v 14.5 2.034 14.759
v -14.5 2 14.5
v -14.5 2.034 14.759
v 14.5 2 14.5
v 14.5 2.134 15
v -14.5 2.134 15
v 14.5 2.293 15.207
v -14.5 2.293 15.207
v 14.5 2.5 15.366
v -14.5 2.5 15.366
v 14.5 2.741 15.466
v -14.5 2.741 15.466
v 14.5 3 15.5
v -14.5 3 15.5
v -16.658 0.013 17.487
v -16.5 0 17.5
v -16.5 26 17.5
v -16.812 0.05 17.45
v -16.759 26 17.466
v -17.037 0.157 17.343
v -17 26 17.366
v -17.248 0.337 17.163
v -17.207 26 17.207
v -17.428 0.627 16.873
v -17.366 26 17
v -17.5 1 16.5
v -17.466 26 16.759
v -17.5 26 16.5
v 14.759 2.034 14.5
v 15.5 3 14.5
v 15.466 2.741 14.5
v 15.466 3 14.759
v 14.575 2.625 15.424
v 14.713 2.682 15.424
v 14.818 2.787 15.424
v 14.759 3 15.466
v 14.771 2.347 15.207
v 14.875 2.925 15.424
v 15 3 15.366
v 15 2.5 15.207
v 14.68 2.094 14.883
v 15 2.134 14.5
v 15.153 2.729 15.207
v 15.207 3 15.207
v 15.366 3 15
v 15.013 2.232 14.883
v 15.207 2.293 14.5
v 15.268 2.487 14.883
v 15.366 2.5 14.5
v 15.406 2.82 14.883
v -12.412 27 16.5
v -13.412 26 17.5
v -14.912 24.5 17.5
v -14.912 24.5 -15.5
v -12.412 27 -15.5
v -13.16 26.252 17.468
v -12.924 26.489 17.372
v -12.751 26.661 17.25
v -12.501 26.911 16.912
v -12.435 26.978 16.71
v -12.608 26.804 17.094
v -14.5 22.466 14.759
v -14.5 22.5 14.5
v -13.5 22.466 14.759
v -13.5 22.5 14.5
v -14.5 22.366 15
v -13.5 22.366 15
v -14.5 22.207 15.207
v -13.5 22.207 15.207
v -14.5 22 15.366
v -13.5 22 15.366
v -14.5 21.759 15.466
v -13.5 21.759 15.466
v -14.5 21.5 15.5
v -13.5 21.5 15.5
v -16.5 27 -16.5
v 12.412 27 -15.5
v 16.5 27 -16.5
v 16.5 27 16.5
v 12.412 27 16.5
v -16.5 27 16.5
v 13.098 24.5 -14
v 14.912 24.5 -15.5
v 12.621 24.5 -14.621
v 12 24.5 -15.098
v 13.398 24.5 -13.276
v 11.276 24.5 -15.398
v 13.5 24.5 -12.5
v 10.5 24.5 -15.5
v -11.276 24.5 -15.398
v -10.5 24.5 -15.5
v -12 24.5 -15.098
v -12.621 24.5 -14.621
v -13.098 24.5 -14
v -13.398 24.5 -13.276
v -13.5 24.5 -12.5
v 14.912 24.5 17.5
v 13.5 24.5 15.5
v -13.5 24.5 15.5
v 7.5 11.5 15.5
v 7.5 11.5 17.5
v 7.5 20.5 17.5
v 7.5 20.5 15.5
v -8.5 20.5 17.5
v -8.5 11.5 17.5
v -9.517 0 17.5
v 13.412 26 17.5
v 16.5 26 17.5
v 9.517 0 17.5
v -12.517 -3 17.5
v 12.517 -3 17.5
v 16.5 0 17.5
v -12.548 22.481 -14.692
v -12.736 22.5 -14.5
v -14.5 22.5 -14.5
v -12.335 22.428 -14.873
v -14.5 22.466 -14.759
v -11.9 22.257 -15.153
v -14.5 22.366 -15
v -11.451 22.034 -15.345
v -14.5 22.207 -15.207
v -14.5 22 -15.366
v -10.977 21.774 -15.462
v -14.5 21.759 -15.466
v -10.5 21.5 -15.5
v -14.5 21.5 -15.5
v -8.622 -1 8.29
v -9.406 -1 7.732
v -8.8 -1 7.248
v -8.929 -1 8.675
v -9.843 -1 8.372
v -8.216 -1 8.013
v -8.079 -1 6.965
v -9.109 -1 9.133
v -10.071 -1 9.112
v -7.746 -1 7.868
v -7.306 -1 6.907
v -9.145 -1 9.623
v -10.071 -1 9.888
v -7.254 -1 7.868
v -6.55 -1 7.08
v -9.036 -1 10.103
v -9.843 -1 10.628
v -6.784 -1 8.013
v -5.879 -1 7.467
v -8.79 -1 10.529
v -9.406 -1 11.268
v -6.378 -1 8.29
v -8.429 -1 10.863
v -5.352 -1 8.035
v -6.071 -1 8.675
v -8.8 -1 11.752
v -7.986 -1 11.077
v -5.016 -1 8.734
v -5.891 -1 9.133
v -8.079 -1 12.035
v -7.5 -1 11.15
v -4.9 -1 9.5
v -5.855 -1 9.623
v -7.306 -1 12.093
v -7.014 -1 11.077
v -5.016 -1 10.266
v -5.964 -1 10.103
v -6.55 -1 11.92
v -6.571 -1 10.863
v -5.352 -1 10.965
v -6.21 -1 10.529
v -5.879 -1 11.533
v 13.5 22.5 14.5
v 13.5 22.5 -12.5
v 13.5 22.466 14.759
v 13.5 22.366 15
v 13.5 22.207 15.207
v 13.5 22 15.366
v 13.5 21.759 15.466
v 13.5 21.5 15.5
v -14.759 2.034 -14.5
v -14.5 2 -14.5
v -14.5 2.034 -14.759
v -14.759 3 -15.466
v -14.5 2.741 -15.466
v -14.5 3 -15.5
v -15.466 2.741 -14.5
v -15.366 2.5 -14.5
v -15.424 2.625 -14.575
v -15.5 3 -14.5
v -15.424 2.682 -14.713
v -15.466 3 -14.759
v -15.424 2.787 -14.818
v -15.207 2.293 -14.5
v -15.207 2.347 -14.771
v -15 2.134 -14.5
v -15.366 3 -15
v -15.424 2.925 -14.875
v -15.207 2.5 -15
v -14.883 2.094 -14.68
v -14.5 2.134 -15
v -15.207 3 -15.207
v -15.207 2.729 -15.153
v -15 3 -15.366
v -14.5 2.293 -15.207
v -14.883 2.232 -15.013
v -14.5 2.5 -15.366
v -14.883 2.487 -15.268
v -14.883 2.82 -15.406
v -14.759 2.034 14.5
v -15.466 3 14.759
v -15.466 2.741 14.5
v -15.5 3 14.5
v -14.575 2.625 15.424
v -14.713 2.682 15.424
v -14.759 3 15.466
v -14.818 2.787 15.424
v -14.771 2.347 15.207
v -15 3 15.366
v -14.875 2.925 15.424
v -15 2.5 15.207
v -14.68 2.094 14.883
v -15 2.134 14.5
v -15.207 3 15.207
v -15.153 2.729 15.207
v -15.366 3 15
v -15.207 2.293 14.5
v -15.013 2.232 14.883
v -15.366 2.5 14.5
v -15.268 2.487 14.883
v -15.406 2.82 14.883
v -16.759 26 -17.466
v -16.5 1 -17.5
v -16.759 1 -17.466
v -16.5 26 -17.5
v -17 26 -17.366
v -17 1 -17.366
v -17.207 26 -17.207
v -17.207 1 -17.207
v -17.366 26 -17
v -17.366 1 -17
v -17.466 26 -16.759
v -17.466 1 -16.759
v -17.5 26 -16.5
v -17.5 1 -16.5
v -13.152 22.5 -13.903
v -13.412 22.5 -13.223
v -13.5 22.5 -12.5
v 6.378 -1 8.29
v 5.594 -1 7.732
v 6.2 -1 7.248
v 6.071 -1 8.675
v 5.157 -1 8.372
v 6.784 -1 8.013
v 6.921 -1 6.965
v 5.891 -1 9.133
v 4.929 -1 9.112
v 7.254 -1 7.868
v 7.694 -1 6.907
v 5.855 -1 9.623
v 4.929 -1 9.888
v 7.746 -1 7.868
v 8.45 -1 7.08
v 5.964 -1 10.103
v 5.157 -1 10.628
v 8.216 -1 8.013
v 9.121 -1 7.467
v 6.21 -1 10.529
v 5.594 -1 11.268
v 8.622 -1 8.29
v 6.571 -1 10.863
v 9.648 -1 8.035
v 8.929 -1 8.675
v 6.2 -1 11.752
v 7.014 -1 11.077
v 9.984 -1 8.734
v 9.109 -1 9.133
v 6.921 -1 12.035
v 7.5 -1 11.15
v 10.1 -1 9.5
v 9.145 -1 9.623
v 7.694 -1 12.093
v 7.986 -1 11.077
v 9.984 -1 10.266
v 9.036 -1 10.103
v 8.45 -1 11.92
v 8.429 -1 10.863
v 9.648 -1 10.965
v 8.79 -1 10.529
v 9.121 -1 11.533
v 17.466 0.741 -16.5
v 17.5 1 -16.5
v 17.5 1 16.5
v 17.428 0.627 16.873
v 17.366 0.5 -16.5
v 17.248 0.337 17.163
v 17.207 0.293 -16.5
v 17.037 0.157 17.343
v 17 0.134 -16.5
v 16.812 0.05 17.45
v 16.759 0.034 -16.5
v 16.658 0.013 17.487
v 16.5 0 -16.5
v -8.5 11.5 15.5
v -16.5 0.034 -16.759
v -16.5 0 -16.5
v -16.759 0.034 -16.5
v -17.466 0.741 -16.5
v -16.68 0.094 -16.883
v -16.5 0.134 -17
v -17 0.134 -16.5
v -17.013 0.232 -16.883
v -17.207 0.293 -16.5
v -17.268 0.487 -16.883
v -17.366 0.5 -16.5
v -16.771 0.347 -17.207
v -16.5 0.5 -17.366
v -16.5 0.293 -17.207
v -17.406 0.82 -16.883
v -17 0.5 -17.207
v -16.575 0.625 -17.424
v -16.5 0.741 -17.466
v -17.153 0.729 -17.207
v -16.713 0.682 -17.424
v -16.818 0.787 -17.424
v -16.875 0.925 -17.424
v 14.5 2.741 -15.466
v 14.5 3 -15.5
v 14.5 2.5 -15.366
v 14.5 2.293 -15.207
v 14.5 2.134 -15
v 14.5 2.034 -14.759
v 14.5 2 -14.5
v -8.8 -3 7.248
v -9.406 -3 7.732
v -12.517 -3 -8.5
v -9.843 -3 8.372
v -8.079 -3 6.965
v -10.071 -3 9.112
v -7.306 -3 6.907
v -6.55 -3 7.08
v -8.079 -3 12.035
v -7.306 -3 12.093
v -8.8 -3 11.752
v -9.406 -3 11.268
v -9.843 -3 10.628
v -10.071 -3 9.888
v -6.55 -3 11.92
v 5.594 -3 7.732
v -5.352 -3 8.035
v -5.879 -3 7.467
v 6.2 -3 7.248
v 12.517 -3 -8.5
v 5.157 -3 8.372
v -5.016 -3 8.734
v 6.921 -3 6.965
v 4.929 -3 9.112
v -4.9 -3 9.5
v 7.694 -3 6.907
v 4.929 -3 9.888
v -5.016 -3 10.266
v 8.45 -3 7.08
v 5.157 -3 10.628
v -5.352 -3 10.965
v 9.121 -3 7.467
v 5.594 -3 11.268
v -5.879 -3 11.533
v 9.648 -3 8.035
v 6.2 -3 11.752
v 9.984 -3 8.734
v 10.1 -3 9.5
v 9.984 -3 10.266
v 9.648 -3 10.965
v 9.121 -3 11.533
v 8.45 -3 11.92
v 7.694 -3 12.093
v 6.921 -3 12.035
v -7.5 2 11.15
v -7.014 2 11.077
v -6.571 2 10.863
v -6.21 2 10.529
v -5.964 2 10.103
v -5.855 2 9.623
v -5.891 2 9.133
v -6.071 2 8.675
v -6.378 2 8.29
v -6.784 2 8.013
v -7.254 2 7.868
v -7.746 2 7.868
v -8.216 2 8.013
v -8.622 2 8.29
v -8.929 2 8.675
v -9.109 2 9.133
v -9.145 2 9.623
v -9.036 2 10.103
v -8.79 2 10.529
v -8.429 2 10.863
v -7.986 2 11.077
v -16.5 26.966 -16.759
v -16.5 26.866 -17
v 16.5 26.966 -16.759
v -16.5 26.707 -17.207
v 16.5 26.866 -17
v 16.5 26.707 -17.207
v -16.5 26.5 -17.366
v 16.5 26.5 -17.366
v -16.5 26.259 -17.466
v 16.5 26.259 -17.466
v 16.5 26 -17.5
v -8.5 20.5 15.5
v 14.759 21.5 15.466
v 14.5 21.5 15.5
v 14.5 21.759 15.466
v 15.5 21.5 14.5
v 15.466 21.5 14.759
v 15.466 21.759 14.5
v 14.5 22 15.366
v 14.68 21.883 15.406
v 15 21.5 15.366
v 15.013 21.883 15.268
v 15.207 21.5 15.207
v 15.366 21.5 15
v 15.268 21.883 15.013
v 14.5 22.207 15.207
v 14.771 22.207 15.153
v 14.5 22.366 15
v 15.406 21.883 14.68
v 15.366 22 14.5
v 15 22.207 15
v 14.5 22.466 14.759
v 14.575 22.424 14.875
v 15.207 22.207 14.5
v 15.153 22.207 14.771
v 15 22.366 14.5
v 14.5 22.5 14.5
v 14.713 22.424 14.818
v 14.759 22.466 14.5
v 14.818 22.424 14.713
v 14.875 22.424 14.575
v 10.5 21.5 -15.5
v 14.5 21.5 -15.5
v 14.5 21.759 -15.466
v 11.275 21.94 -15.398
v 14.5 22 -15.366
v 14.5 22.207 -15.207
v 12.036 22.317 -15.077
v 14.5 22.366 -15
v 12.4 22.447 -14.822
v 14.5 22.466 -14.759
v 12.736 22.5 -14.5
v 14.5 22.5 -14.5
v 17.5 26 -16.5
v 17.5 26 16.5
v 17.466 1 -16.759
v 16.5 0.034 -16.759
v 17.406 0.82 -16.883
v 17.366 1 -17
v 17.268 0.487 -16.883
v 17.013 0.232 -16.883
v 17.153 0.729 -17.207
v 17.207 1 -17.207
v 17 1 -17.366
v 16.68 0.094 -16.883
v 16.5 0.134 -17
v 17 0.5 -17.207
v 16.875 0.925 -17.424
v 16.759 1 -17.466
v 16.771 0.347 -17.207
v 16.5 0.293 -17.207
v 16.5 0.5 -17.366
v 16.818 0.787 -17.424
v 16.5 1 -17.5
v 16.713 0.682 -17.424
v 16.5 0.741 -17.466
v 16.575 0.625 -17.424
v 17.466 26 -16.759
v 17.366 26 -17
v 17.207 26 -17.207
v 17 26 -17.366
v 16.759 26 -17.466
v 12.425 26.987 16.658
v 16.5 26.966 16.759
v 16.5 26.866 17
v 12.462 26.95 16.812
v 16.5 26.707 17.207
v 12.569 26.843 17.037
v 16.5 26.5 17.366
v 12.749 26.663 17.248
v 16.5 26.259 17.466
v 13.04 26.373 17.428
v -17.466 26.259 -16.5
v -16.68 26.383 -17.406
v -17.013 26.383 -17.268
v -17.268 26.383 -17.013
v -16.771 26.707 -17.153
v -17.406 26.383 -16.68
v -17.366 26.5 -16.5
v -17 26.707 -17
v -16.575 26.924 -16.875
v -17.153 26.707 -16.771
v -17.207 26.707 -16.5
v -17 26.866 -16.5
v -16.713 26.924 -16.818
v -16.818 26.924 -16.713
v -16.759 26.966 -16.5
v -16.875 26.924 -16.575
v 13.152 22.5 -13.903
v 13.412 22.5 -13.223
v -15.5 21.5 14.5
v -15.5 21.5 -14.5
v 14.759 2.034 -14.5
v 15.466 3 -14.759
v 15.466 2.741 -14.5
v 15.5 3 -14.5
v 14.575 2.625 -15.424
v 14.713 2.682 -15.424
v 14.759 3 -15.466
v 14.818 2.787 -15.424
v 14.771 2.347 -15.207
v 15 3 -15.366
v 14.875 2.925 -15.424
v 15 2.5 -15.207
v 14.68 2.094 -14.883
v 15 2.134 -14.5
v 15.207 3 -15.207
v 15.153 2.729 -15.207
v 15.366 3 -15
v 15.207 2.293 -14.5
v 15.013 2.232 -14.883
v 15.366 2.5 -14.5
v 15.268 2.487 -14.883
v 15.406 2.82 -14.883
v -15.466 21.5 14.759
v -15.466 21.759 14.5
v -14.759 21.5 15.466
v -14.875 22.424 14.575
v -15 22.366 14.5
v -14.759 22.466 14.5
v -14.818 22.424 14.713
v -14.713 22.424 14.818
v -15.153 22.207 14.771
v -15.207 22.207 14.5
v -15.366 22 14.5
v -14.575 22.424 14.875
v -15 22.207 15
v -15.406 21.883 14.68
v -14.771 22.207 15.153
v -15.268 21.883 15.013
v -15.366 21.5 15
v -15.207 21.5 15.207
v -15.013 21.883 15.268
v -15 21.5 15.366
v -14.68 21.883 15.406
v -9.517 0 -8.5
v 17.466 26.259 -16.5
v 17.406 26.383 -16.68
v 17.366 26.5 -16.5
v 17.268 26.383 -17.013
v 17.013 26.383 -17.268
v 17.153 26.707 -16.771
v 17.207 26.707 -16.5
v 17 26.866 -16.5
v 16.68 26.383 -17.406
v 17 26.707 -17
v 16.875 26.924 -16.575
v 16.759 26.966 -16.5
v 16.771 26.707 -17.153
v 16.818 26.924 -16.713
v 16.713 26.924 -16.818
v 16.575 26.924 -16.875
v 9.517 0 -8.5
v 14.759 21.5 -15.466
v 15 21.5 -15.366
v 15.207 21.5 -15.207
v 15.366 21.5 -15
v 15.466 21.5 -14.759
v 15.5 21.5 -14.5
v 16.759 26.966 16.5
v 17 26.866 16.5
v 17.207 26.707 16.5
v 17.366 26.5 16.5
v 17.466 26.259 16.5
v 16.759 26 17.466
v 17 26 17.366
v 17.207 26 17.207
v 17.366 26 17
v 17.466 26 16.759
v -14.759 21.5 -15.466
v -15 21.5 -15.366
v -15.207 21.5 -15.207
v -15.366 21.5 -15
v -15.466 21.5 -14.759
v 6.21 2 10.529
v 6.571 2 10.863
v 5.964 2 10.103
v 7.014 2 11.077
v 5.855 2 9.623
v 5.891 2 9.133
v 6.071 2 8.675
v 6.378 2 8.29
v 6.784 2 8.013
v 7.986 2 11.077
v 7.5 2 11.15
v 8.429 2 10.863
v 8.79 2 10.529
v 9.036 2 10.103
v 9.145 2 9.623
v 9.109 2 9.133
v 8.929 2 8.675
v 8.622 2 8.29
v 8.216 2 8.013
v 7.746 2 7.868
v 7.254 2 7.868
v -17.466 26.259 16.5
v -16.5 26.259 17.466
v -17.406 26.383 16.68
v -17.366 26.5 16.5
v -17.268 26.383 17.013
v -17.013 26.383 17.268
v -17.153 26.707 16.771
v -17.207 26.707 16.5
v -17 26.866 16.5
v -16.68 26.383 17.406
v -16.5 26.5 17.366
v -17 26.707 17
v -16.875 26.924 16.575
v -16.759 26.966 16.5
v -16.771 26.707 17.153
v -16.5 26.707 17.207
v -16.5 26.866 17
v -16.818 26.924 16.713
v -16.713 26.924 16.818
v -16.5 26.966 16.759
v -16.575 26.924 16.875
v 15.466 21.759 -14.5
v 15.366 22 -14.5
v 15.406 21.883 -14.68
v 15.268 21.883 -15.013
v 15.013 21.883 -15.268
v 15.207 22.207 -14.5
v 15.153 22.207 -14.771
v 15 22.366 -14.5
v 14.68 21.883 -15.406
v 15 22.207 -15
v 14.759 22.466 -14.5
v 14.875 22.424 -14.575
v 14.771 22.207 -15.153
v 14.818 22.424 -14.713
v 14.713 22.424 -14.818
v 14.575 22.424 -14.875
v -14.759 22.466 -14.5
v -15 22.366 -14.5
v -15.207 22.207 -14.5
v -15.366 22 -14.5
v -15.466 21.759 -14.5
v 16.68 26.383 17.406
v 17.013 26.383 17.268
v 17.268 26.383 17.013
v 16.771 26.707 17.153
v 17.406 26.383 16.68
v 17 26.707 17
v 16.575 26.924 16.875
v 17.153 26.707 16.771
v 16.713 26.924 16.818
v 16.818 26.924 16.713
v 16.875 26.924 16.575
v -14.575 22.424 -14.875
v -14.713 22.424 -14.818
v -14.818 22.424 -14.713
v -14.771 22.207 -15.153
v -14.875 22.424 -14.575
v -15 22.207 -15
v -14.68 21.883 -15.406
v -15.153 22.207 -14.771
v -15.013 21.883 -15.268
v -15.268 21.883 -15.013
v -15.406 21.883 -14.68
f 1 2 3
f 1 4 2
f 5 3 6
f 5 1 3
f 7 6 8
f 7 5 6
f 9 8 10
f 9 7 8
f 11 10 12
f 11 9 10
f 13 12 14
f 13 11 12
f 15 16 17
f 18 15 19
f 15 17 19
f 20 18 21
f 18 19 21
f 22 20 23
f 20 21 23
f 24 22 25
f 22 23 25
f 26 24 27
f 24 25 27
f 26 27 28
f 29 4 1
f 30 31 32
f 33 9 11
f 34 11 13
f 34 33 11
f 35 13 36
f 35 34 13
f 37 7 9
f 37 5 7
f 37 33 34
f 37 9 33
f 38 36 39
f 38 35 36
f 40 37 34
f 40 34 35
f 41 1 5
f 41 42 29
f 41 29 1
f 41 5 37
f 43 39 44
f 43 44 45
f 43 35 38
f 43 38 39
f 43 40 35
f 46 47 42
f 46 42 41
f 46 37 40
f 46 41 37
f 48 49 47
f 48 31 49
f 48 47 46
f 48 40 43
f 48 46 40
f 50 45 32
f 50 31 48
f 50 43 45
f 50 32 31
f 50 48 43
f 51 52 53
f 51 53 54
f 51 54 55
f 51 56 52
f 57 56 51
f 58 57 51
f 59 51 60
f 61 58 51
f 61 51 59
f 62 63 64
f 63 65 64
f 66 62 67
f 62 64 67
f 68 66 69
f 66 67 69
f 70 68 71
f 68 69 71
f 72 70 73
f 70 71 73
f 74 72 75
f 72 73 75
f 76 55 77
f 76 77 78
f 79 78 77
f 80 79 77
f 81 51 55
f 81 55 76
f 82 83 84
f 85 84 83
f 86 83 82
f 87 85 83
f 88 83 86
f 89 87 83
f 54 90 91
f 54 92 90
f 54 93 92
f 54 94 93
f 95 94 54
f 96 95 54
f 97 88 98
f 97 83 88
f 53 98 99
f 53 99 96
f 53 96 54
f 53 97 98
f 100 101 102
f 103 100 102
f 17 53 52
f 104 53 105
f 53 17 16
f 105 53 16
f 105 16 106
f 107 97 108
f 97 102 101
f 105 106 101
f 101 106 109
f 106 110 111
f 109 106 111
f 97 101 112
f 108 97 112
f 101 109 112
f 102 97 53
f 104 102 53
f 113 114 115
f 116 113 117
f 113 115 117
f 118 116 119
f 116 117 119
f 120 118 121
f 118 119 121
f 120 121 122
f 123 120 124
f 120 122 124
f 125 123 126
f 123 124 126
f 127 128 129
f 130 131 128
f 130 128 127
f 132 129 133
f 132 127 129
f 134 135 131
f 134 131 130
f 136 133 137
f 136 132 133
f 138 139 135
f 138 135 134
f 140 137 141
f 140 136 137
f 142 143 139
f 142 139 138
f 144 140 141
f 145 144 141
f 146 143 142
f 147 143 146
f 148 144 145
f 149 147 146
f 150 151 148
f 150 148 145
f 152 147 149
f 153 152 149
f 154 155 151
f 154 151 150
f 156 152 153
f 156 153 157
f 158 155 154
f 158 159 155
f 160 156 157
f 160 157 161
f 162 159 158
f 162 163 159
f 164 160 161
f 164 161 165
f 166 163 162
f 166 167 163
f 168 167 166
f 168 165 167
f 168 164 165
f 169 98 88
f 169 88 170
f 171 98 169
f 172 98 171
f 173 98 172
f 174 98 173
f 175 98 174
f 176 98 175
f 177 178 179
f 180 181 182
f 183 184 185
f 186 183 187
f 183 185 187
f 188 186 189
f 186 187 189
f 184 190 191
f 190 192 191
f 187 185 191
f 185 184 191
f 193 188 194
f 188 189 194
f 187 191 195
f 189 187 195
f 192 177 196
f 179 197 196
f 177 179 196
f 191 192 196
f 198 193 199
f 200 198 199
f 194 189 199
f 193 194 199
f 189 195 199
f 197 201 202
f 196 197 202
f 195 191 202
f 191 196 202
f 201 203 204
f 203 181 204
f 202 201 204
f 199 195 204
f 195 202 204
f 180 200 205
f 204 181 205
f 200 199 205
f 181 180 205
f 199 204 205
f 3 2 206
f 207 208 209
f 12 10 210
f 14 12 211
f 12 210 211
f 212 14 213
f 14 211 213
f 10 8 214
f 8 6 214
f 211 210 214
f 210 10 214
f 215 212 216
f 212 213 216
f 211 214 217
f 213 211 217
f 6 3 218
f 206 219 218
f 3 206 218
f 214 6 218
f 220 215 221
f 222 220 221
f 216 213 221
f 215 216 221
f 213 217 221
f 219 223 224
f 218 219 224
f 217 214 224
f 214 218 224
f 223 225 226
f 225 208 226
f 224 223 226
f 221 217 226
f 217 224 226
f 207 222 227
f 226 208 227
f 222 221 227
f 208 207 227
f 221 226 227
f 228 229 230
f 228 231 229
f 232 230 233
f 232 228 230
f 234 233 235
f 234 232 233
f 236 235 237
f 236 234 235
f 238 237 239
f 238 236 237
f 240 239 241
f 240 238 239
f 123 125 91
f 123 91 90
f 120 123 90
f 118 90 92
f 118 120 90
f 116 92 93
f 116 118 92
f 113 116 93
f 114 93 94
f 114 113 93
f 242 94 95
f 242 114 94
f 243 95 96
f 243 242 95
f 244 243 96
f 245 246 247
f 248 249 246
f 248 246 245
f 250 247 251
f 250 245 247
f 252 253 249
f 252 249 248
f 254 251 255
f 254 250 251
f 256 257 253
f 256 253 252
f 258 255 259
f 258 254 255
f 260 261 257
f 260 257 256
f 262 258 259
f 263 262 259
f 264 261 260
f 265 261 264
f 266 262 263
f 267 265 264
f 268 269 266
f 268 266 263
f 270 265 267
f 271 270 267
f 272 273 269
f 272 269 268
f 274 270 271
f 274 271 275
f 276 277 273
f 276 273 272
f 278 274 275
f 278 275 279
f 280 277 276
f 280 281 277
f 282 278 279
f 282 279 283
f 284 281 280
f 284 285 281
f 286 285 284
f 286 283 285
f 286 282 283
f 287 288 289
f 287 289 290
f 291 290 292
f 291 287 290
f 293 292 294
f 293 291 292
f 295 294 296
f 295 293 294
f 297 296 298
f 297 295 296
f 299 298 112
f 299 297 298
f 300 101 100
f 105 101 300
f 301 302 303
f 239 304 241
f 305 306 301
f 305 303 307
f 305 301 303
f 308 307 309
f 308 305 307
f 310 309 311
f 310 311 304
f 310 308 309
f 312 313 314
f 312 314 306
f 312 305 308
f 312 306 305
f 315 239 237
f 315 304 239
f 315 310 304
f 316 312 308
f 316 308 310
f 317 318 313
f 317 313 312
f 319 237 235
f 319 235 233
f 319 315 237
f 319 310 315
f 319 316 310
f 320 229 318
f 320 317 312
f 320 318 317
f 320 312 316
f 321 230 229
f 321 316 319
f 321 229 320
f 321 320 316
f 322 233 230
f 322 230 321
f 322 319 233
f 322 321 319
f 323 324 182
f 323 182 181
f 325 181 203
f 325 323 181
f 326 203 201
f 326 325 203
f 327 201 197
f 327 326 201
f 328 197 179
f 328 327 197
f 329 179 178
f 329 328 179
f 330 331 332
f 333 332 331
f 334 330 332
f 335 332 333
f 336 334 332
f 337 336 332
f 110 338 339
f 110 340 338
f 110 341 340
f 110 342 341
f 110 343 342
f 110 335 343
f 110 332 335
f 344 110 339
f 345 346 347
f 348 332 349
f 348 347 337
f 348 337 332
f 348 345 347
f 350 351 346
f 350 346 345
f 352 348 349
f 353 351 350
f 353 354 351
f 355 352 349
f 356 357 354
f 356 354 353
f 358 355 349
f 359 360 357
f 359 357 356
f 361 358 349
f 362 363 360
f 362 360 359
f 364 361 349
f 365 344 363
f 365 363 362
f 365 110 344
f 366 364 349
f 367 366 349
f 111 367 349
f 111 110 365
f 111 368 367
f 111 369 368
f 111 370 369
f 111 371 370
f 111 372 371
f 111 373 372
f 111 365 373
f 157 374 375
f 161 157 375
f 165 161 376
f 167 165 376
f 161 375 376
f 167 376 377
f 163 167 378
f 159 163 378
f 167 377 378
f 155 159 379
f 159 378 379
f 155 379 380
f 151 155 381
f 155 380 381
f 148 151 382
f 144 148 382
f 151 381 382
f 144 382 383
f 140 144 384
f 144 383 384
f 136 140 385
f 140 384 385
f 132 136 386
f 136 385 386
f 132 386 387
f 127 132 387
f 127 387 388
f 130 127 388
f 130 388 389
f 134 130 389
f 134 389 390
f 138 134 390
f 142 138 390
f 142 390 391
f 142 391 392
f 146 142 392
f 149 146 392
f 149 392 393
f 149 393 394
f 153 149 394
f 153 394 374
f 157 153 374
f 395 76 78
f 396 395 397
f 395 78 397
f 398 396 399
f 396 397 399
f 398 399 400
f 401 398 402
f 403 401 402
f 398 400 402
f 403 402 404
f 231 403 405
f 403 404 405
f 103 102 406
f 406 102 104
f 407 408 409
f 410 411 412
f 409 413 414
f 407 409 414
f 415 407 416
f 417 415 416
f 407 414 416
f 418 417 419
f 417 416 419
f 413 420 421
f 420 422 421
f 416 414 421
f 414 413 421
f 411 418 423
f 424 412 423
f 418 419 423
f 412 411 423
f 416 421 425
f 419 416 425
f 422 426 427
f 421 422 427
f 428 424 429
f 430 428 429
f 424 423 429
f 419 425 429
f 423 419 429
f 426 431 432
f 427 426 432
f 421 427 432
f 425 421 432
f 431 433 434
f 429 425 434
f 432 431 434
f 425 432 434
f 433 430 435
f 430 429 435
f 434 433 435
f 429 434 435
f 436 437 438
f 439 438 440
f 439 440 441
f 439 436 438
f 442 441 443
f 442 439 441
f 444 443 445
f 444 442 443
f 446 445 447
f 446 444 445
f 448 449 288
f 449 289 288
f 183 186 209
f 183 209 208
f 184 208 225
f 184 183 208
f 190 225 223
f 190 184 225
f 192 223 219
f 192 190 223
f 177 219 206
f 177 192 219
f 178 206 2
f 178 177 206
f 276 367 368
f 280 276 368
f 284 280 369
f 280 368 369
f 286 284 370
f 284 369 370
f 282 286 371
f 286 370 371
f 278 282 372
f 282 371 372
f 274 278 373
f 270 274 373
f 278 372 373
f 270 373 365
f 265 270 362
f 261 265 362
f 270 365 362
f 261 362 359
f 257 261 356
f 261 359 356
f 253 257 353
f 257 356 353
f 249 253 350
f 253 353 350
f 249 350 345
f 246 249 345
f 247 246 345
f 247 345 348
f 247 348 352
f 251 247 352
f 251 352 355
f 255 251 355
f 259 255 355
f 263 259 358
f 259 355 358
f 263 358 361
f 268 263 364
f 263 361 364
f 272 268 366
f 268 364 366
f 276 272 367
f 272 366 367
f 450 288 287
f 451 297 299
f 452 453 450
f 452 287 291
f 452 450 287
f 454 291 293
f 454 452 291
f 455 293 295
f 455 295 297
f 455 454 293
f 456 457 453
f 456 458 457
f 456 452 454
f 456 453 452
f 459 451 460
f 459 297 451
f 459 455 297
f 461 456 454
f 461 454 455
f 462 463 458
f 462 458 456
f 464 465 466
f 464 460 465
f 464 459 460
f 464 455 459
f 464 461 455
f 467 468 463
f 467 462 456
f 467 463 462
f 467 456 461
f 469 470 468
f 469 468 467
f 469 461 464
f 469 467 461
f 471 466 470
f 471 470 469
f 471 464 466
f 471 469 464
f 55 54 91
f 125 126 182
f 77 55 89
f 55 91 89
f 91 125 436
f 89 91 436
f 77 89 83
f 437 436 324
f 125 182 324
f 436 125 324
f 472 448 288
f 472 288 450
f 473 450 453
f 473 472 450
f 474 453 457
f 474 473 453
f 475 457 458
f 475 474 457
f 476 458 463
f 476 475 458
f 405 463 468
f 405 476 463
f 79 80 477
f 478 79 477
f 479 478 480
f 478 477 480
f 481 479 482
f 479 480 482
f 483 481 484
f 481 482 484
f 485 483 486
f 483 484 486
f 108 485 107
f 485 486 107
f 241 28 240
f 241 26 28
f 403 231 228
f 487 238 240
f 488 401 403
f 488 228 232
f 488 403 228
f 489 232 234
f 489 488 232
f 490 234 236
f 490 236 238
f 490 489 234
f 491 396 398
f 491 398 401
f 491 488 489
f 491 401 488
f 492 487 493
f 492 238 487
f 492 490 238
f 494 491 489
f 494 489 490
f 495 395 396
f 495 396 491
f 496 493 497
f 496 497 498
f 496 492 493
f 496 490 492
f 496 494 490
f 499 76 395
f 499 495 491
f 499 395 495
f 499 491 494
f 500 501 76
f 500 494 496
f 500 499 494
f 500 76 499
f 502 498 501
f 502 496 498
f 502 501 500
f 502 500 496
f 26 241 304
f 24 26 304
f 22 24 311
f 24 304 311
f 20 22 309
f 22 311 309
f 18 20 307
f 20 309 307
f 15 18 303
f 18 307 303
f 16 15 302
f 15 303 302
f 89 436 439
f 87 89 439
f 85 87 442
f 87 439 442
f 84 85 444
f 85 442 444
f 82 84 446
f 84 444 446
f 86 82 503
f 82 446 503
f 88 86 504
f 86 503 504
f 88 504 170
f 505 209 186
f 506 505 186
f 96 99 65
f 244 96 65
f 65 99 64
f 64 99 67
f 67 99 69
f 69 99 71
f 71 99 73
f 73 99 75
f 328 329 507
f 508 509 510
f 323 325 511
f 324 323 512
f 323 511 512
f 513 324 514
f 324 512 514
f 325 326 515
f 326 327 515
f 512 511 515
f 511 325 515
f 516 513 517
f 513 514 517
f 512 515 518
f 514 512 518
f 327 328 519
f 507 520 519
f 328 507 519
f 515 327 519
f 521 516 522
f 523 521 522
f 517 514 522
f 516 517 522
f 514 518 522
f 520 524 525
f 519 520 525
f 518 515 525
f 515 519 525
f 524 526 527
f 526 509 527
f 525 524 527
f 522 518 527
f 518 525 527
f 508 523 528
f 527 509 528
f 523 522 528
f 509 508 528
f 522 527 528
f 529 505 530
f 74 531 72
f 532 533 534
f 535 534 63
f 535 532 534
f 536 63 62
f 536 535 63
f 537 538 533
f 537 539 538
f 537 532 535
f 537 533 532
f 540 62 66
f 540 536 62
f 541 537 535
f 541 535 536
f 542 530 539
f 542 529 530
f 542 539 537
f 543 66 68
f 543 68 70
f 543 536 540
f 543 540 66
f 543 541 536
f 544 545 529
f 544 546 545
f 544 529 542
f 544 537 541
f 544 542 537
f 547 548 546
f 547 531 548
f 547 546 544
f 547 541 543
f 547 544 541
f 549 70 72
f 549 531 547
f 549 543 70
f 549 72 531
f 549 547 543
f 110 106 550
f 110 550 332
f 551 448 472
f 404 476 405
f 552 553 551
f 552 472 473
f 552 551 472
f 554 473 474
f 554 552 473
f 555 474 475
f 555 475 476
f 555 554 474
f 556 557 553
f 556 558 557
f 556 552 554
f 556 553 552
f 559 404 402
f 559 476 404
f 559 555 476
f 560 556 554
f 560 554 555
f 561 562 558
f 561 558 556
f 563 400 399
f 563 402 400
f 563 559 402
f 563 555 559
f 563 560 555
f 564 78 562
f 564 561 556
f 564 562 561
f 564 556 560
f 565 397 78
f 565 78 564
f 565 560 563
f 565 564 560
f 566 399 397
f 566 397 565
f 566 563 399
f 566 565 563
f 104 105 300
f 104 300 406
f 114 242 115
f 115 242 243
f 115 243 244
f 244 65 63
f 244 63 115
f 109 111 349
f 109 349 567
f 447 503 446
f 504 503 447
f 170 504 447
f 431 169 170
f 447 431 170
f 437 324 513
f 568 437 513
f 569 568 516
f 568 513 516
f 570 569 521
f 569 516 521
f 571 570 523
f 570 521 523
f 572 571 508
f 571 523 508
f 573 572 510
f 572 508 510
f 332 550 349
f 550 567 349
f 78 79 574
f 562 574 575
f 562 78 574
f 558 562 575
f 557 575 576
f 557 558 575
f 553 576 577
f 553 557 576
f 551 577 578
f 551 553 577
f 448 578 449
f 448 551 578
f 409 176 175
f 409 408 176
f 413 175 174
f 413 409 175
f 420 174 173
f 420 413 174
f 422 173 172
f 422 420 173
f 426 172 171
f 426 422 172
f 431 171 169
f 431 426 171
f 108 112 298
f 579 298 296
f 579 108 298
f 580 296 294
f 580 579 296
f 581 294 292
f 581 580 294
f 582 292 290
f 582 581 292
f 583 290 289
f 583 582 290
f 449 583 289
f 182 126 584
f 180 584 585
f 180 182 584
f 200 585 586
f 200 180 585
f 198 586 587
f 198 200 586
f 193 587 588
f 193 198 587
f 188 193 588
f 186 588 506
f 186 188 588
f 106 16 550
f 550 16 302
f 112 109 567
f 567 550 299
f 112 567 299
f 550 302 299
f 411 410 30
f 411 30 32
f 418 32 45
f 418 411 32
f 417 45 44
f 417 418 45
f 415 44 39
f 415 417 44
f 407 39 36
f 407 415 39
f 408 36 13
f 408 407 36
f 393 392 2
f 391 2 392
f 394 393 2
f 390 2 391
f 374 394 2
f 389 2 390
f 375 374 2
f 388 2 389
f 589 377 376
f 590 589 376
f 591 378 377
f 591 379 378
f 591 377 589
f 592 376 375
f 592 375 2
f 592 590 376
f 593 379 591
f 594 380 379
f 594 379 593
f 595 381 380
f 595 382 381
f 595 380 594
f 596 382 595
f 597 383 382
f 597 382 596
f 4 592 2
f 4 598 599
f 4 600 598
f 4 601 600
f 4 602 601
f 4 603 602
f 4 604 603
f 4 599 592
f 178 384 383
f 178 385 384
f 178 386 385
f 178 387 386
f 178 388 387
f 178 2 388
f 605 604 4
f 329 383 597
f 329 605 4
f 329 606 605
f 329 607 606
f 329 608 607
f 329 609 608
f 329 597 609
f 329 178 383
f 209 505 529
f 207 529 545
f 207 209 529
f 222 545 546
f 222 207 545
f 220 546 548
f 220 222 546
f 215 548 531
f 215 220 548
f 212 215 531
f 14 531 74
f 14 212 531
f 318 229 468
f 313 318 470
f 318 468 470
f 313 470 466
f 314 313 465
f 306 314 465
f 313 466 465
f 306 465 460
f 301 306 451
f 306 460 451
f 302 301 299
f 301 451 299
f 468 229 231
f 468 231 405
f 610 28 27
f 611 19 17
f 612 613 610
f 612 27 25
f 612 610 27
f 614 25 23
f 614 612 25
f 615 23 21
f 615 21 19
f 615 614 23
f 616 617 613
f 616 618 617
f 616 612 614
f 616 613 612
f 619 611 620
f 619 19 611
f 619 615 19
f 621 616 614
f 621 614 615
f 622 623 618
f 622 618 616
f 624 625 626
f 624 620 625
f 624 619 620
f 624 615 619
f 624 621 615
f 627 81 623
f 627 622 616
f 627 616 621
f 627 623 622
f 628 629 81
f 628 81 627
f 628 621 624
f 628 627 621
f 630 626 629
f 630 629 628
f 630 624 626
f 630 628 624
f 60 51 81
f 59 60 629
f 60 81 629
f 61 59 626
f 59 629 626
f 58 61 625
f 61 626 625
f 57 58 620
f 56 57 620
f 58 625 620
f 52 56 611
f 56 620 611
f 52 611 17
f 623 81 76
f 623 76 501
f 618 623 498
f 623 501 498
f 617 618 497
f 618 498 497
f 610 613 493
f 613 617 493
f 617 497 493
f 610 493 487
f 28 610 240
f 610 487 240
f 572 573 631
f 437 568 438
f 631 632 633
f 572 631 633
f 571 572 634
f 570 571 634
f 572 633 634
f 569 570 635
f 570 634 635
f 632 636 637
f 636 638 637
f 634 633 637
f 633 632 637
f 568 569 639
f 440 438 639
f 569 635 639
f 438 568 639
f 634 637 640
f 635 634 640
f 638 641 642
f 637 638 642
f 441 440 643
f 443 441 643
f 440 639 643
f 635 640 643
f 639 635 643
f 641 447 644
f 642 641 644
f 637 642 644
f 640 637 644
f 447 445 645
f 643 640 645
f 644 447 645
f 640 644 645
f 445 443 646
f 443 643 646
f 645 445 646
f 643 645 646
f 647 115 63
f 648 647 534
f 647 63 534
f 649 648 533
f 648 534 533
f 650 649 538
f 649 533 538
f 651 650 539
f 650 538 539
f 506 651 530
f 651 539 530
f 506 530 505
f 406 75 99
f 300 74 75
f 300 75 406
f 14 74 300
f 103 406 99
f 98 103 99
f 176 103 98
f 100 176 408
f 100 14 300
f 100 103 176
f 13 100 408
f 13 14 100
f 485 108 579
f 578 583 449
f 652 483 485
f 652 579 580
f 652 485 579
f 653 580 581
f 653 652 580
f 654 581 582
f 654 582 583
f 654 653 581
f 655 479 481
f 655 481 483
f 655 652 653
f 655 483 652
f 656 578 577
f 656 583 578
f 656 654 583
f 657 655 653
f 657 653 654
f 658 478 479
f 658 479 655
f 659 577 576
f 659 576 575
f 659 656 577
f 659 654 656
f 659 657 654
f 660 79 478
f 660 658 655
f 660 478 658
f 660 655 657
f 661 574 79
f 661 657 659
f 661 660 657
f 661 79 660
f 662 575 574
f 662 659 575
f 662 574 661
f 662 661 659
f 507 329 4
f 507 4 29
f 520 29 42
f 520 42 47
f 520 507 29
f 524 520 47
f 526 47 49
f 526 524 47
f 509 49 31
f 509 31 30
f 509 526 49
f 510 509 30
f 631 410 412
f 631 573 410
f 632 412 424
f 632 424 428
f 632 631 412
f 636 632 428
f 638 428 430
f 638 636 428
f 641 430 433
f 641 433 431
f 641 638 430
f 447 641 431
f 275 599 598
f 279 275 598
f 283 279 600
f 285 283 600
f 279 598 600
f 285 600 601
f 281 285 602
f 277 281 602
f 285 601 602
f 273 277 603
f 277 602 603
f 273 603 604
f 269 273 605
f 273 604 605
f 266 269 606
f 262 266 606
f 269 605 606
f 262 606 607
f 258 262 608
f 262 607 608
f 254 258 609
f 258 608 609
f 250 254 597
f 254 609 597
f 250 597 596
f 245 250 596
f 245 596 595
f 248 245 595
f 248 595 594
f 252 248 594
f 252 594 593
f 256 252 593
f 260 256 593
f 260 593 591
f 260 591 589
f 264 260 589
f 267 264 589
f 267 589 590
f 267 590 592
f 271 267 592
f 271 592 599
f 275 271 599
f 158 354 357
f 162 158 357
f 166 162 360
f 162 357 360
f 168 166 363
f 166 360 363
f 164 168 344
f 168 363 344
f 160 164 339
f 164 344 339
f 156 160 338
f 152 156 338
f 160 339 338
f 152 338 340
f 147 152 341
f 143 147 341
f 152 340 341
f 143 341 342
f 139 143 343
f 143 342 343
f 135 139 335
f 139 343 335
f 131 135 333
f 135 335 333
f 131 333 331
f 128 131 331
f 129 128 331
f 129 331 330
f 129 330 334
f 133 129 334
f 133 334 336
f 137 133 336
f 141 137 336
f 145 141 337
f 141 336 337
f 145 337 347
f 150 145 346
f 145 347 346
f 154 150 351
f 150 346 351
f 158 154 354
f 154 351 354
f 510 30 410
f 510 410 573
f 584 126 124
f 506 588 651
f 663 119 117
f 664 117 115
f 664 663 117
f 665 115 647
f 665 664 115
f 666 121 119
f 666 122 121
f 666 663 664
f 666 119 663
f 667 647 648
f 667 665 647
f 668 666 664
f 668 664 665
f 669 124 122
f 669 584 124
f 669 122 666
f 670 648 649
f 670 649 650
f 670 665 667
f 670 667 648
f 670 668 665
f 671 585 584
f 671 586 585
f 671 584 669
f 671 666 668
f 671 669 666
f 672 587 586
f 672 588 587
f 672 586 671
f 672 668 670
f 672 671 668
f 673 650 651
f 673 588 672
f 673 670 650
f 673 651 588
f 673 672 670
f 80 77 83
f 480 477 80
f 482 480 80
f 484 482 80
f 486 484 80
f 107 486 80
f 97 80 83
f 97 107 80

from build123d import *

# Parameters (mm, degrees)
SKETCH1_W           = 35
SKETCH1_H           = 35
BOSS_EXTRUDE1_DEPTH = 27
SHELL1_T            = -2
CUT_EXTRUDE7_DEPTH  = 33
BOSS_EXTRUDE4_DEPTH = 31
BOSS_EXTRUDE3_DEPTH = 26
FILLET1_R           = 1
FILLET2_R           = 1
FILLET3_R           = 1
FILLET4_R           = 1
SKETCH10_R          = 1.65
CUT_EXTRUDE3_DEPTH  = 36.178118199
SKETCH11_W          = 16
SKETCH11_H          = 9
CUT_EXTRUDE4_DEPTH  = 2
SKETCH13_R          = 2.6
CUT_EXTRUDE6_DEPTH  = 2
FILLET5_R           = 3
FILLET6_R           = 1


with BuildPart() as part:
    # Sketch1 → Boss-Extrude1 (new body)
    with BuildSketch(Plane(origin=(0, 0, 0), x_dir=(1, 0, 0), z_dir=(0, 1, 0))):
        Rectangle(SKETCH1_W, SKETCH1_H)
    extrude(amount=BOSS_EXTRUDE1_DEPTH)

    # Shell1
    shell1_openings = [part.faces().sort_by_distance(p)[0] for p in [
        (0, 27, 0),
    ]]
    offset(amount=SHELL1_T, openings=shell1_openings, kind=Kind.INTERSECTION)

    # Sketch5 → Cut-Extrude7 (cut)
    with BuildSketch(Plane.XY.offset(17.5)):
        Polygon((-12.412133126, 27), (12.412133126, 27), (14.912133126, 24.5), (-14.912133126, 24.5), align=None)
    extrude(amount=-CUT_EXTRUDE7_DEPTH, mode=Mode.SUBTRACT)

    # Sketch16 → Boss-Extrude4 (add)
    with BuildSketch(Plane(origin=(0, 0, 15.5), x_dir=(-1, 0, 0), z_dir=(0, 0, -1))):
        Polygon((-15.5, 27), (-12.412133126, 27), (-14.912133126, 24.5), (-13.5, 24.5), (-13.5, 22.5), (-15.5, 22.5), align=None)
        Polygon((13.5, 22.5), (15.5, 22.5), (15.5, 27), (12.412133126, 27), (14.912133126, 24.5), (13.5, 24.5), align=None)
    extrude(amount=BOSS_EXTRUDE4_DEPTH)

    # Sketch9 → Boss-Extrude3 (add)
    with BuildSketch(Plane.XY.offset(17.5)):
        Polygon((-9.517157288, 0), (-12.517157288, -3), (12.517157288, -3), (9.517157288, 0), align=None)
    extrude(amount=-BOSS_EXTRUDE3_DEPTH)

    # Fillet1
    fillet1_edges = [part.edges().sort_by_distance(p)[0] for p in [
        (15.5, 2, 0),
        (0, 2, -15.5),
        (-15.5, 2, 0),
        (0, 2, 15.5),
        (15.5, 12.25, 15.5),
        (15.5, 12.25, -15.5),
        (-15.5, 12.25, -15.5),
        (-15.5, 12.25, 15.5),
    ]]
    fillet(fillet1_edges, radius=FILLET1_R)

    # Fillet2
    fillet2_edges = [part.edges().sort_by_distance(p)[0] for p in [
        (-17.5, 27, 0),
        (17.5, 27, 0),
        (-17.5, 0, 0),
        (17.5, 0, 0),
        (17.5, 13.5, 17.5),
        (-17.5, 13.5, 17.5),
        (-17.5, 13.5, -17.5),
        (17.5, 13.5, -17.5),
    ]]
    fillet(fillet2_edges, radius=FILLET2_R)

    # Fillet3
    # the kernel refuses this fillet: 1 mm, written as the material it takes off along each edge
    with BuildSketch(Plane(origin=(16.5, 26, -16.5), x_dir=(0, 0, -1), z_dir=(0, 1, 0))) as fillet3_piece_1_section:
        Polygon((0, 0), (FILLET3_R, 0), (FILLET3_R, -FILLET3_R), (0, -FILLET3_R), align=None)
    fillet3_piece_1 = extrude(amount=FILLET3_R, mode=Mode.PRIVATE)
    fillet3_piece_1 = fillet3_piece_1 - Plane(origin=(16.5, 26, -16.5), x_dir=(-0.7071067811865475, 0, 0.7071067811865475), z_dir=(0, 1, 0)) * Sphere(FILLET3_R, mode=Mode.PRIVATE)
    add(fillet3_piece_1, mode=Mode.SUBTRACT)
    with BuildSketch(Plane(origin=(16.5, 1, -16.5), x_dir=(0, -1, 0), z_dir=(0, 0, -1))) as fillet3_piece_2_section:
        Polygon((0, 0), (FILLET3_R, 0), (FILLET3_R, -FILLET3_R), (0, -FILLET3_R), align=None)
    fillet3_piece_2 = extrude(amount=FILLET3_R, mode=Mode.PRIVATE)
    fillet3_piece_2 = fillet3_piece_2 - Plane(origin=(16.5, 1, -16.5), x_dir=(-0.7071067811865475, 0.7071067811865475, 0), z_dir=(0, 0, -1)) * Sphere(FILLET3_R, mode=Mode.PRIVATE)
    add(fillet3_piece_2, mode=Mode.SUBTRACT)
    with BuildSketch(Plane(origin=(-16.5, 26, -16.5), x_dir=(0, 0, -1), z_dir=(0, 1, 0))) as fillet3_piece_3_section:
        Polygon((0, 0), (FILLET3_R, 0), (FILLET3_R, FILLET3_R), (0, FILLET3_R), align=None)
    fillet3_piece_3 = extrude(amount=FILLET3_R, mode=Mode.PRIVATE)
    fillet3_piece_3 = fillet3_piece_3 - Plane(origin=(-16.5, 26, -16.5), x_dir=(0.7071067811865475, 0, 0.7071067811865475), z_dir=(0, 1, 0)) * Sphere(FILLET3_R, mode=Mode.PRIVATE)
    add(fillet3_piece_3, mode=Mode.SUBTRACT)
    with BuildSketch(Plane(origin=(-16.5, 1, -16.5), x_dir=(0, -1, 0), z_dir=(0, 0, -1))) as fillet3_piece_4_section:
        Polygon((0, 0), (FILLET3_R, 0), (FILLET3_R, FILLET3_R), (0, FILLET3_R), align=None)
    fillet3_piece_4 = extrude(amount=FILLET3_R, mode=Mode.PRIVATE)
    fillet3_piece_4 = fillet3_piece_4 - Plane(origin=(-16.5, 1, -16.5), x_dir=(0.7071067811865475, 0.7071067811865475, 0), z_dir=(0, 0, -1)) * Sphere(FILLET3_R, mode=Mode.PRIVATE)
    add(fillet3_piece_4, mode=Mode.SUBTRACT)
    with BuildSketch(Plane(origin=(16.5, 27, -17.5), x_dir=(0, 0, 1), z_dir=(-1, 0, 0)), Plane(origin=(16.5, 0, -17.5), x_dir=(0, 1, 0), z_dir=(-1, 0, 0))) as fillet3_piece_5:
        with BuildLine():
            CenterArc((FILLET3_R, -FILLET3_R), FILLET3_R, 90, 90)
            Line((0, -FILLET3_R), (0, 0))
            Line((0, 0), (FILLET3_R, 0))
        make_face()
    extrude(amount=33, mode=Mode.SUBTRACT)

    # Fillet4
    # the kernel refuses this fillet: 1 mm, written as the material it takes off along each edge
    with BuildSketch(Plane(origin=(16.5, 26, 16.5), x_dir=(0, 0, 1), z_dir=(0, 1, 0))) as fillet4_piece_1_section:
        Polygon((0, 0), (FILLET4_R, 0), (FILLET4_R, FILLET4_R), (0, FILLET4_R), align=None)
    fillet4_piece_1 = extrude(amount=FILLET4_R, mode=Mode.PRIVATE)
    fillet4_piece_1 = fillet4_piece_1 - Plane(origin=(16.5, 26, 16.5), x_dir=(-0.7071067811865475, 0, -0.7071067811865475), z_dir=(0, 1, 0)) * Sphere(FILLET4_R, mode=Mode.PRIVATE)
    add(fillet4_piece_1, mode=Mode.SUBTRACT)
    with BuildSketch(Plane(origin=(-16.5, 26, 16.5), x_dir=(0, 0, 1), z_dir=(0, 1, 0))) as fillet4_piece_2_section:
        Polygon((0, 0), (FILLET4_R, 0), (FILLET4_R, -FILLET4_R), (0, -FILLET4_R), align=None)
    fillet4_piece_2 = extrude(amount=FILLET4_R, mode=Mode.PRIVATE)
    fillet4_piece_2 = fillet4_piece_2 - Plane(origin=(-16.5, 26, 16.5), x_dir=(0.7071067811865475, 0, -0.7071067811865475), z_dir=(0, 1, 0)) * Sphere(FILLET4_R, mode=Mode.PRIVATE)
    add(fillet4_piece_2, mode=Mode.SUBTRACT)
    with BuildSketch(Plane(origin=(-16.5, 27, 17.5), x_dir=(0, 0, -1), z_dir=(1, 0, 0)), Plane(origin=(9.912133126, 27, 17.5), x_dir=(0, 0, -1), z_dir=(1, 0, 0))) as fillet4_piece_3:
        with BuildLine():
            CenterArc((FILLET4_R, -FILLET4_R), FILLET4_R, 90, 90)
            Line((0, -FILLET4_R), (0, 0))
            Line((0, 0), (FILLET4_R, 0))
        make_face()
    extrude(amount=6.587866874, mode=Mode.SUBTRACT)

    # Sketch10 → Cut-Extrude3 (cut, through all)
    with BuildSketch(Plane(origin=(0, 2, 0), x_dir=(1, 0, 0), z_dir=(0, 1, 0))):
        with Locations(Location((-7.5, -9.5, 0), (0, 0, 270))):
            Circle(SKETCH10_R)
        with Locations(Location((7.5, -9.5, 0), (0, 0, 270))):
            Circle(SKETCH10_R)
    extrude(amount=-CUT_EXTRUDE3_DEPTH, mode=Mode.SUBTRACT)

    # Sketch11 → Cut-Extrude4 (cut)
    with BuildSketch(Plane(origin=(0, 0, 17.5), x_dir=(-1, 0, 0), z_dir=(0, 0, -1))):
        with Locations((0.5, 16)):
            Rectangle(SKETCH11_W, SKETCH11_H)
    extrude(amount=CUT_EXTRUDE4_DEPTH, mode=Mode.SUBTRACT)

    # Sketch13 → Cut-Extrude6 (cut)
    with BuildSketch(Plane.XZ.offset(3)):
        with Locations((-7.5, 9.5)):
            Circle(SKETCH13_R)
        with Locations((7.5, 9.5)):
            Circle(SKETCH13_R)
    extrude(amount=-CUT_EXTRUDE6_DEPTH, mode=Mode.SUBTRACT)

    # Fillet5
    fillet5_edges = [part.edges().sort_by_distance(p)[0] for p in [
        (13.5, 23.5, -15.5),
        (-13.5, 23.5, -15.5),
    ]]
    fillet(fillet5_edges, radius=FILLET5_R)

    # Fillet6
    fillet6_edges = [part.edges().sort_by_distance(p)[0] for p in [
        (-15.207106781, 22.5, -15.207106781),
        (-15.207106781, 22.5, 15.207106781),
        (15.5, 22.5, 0),
        (15.207106781, 22.5, 15.207106781),
        (15.207106781, 22.5, -15.207106781),
        (12.5, 22.5, -15.5),
        (-14, 22.5, 15.5),
        (-15.5, 22.5, 0),
        (14, 22.5, 15.5),
        (-12.5, 22.5, -15.5),
    ]]
    fillet(fillet6_edges, radius=FILLET6_R)


solid = part.part
